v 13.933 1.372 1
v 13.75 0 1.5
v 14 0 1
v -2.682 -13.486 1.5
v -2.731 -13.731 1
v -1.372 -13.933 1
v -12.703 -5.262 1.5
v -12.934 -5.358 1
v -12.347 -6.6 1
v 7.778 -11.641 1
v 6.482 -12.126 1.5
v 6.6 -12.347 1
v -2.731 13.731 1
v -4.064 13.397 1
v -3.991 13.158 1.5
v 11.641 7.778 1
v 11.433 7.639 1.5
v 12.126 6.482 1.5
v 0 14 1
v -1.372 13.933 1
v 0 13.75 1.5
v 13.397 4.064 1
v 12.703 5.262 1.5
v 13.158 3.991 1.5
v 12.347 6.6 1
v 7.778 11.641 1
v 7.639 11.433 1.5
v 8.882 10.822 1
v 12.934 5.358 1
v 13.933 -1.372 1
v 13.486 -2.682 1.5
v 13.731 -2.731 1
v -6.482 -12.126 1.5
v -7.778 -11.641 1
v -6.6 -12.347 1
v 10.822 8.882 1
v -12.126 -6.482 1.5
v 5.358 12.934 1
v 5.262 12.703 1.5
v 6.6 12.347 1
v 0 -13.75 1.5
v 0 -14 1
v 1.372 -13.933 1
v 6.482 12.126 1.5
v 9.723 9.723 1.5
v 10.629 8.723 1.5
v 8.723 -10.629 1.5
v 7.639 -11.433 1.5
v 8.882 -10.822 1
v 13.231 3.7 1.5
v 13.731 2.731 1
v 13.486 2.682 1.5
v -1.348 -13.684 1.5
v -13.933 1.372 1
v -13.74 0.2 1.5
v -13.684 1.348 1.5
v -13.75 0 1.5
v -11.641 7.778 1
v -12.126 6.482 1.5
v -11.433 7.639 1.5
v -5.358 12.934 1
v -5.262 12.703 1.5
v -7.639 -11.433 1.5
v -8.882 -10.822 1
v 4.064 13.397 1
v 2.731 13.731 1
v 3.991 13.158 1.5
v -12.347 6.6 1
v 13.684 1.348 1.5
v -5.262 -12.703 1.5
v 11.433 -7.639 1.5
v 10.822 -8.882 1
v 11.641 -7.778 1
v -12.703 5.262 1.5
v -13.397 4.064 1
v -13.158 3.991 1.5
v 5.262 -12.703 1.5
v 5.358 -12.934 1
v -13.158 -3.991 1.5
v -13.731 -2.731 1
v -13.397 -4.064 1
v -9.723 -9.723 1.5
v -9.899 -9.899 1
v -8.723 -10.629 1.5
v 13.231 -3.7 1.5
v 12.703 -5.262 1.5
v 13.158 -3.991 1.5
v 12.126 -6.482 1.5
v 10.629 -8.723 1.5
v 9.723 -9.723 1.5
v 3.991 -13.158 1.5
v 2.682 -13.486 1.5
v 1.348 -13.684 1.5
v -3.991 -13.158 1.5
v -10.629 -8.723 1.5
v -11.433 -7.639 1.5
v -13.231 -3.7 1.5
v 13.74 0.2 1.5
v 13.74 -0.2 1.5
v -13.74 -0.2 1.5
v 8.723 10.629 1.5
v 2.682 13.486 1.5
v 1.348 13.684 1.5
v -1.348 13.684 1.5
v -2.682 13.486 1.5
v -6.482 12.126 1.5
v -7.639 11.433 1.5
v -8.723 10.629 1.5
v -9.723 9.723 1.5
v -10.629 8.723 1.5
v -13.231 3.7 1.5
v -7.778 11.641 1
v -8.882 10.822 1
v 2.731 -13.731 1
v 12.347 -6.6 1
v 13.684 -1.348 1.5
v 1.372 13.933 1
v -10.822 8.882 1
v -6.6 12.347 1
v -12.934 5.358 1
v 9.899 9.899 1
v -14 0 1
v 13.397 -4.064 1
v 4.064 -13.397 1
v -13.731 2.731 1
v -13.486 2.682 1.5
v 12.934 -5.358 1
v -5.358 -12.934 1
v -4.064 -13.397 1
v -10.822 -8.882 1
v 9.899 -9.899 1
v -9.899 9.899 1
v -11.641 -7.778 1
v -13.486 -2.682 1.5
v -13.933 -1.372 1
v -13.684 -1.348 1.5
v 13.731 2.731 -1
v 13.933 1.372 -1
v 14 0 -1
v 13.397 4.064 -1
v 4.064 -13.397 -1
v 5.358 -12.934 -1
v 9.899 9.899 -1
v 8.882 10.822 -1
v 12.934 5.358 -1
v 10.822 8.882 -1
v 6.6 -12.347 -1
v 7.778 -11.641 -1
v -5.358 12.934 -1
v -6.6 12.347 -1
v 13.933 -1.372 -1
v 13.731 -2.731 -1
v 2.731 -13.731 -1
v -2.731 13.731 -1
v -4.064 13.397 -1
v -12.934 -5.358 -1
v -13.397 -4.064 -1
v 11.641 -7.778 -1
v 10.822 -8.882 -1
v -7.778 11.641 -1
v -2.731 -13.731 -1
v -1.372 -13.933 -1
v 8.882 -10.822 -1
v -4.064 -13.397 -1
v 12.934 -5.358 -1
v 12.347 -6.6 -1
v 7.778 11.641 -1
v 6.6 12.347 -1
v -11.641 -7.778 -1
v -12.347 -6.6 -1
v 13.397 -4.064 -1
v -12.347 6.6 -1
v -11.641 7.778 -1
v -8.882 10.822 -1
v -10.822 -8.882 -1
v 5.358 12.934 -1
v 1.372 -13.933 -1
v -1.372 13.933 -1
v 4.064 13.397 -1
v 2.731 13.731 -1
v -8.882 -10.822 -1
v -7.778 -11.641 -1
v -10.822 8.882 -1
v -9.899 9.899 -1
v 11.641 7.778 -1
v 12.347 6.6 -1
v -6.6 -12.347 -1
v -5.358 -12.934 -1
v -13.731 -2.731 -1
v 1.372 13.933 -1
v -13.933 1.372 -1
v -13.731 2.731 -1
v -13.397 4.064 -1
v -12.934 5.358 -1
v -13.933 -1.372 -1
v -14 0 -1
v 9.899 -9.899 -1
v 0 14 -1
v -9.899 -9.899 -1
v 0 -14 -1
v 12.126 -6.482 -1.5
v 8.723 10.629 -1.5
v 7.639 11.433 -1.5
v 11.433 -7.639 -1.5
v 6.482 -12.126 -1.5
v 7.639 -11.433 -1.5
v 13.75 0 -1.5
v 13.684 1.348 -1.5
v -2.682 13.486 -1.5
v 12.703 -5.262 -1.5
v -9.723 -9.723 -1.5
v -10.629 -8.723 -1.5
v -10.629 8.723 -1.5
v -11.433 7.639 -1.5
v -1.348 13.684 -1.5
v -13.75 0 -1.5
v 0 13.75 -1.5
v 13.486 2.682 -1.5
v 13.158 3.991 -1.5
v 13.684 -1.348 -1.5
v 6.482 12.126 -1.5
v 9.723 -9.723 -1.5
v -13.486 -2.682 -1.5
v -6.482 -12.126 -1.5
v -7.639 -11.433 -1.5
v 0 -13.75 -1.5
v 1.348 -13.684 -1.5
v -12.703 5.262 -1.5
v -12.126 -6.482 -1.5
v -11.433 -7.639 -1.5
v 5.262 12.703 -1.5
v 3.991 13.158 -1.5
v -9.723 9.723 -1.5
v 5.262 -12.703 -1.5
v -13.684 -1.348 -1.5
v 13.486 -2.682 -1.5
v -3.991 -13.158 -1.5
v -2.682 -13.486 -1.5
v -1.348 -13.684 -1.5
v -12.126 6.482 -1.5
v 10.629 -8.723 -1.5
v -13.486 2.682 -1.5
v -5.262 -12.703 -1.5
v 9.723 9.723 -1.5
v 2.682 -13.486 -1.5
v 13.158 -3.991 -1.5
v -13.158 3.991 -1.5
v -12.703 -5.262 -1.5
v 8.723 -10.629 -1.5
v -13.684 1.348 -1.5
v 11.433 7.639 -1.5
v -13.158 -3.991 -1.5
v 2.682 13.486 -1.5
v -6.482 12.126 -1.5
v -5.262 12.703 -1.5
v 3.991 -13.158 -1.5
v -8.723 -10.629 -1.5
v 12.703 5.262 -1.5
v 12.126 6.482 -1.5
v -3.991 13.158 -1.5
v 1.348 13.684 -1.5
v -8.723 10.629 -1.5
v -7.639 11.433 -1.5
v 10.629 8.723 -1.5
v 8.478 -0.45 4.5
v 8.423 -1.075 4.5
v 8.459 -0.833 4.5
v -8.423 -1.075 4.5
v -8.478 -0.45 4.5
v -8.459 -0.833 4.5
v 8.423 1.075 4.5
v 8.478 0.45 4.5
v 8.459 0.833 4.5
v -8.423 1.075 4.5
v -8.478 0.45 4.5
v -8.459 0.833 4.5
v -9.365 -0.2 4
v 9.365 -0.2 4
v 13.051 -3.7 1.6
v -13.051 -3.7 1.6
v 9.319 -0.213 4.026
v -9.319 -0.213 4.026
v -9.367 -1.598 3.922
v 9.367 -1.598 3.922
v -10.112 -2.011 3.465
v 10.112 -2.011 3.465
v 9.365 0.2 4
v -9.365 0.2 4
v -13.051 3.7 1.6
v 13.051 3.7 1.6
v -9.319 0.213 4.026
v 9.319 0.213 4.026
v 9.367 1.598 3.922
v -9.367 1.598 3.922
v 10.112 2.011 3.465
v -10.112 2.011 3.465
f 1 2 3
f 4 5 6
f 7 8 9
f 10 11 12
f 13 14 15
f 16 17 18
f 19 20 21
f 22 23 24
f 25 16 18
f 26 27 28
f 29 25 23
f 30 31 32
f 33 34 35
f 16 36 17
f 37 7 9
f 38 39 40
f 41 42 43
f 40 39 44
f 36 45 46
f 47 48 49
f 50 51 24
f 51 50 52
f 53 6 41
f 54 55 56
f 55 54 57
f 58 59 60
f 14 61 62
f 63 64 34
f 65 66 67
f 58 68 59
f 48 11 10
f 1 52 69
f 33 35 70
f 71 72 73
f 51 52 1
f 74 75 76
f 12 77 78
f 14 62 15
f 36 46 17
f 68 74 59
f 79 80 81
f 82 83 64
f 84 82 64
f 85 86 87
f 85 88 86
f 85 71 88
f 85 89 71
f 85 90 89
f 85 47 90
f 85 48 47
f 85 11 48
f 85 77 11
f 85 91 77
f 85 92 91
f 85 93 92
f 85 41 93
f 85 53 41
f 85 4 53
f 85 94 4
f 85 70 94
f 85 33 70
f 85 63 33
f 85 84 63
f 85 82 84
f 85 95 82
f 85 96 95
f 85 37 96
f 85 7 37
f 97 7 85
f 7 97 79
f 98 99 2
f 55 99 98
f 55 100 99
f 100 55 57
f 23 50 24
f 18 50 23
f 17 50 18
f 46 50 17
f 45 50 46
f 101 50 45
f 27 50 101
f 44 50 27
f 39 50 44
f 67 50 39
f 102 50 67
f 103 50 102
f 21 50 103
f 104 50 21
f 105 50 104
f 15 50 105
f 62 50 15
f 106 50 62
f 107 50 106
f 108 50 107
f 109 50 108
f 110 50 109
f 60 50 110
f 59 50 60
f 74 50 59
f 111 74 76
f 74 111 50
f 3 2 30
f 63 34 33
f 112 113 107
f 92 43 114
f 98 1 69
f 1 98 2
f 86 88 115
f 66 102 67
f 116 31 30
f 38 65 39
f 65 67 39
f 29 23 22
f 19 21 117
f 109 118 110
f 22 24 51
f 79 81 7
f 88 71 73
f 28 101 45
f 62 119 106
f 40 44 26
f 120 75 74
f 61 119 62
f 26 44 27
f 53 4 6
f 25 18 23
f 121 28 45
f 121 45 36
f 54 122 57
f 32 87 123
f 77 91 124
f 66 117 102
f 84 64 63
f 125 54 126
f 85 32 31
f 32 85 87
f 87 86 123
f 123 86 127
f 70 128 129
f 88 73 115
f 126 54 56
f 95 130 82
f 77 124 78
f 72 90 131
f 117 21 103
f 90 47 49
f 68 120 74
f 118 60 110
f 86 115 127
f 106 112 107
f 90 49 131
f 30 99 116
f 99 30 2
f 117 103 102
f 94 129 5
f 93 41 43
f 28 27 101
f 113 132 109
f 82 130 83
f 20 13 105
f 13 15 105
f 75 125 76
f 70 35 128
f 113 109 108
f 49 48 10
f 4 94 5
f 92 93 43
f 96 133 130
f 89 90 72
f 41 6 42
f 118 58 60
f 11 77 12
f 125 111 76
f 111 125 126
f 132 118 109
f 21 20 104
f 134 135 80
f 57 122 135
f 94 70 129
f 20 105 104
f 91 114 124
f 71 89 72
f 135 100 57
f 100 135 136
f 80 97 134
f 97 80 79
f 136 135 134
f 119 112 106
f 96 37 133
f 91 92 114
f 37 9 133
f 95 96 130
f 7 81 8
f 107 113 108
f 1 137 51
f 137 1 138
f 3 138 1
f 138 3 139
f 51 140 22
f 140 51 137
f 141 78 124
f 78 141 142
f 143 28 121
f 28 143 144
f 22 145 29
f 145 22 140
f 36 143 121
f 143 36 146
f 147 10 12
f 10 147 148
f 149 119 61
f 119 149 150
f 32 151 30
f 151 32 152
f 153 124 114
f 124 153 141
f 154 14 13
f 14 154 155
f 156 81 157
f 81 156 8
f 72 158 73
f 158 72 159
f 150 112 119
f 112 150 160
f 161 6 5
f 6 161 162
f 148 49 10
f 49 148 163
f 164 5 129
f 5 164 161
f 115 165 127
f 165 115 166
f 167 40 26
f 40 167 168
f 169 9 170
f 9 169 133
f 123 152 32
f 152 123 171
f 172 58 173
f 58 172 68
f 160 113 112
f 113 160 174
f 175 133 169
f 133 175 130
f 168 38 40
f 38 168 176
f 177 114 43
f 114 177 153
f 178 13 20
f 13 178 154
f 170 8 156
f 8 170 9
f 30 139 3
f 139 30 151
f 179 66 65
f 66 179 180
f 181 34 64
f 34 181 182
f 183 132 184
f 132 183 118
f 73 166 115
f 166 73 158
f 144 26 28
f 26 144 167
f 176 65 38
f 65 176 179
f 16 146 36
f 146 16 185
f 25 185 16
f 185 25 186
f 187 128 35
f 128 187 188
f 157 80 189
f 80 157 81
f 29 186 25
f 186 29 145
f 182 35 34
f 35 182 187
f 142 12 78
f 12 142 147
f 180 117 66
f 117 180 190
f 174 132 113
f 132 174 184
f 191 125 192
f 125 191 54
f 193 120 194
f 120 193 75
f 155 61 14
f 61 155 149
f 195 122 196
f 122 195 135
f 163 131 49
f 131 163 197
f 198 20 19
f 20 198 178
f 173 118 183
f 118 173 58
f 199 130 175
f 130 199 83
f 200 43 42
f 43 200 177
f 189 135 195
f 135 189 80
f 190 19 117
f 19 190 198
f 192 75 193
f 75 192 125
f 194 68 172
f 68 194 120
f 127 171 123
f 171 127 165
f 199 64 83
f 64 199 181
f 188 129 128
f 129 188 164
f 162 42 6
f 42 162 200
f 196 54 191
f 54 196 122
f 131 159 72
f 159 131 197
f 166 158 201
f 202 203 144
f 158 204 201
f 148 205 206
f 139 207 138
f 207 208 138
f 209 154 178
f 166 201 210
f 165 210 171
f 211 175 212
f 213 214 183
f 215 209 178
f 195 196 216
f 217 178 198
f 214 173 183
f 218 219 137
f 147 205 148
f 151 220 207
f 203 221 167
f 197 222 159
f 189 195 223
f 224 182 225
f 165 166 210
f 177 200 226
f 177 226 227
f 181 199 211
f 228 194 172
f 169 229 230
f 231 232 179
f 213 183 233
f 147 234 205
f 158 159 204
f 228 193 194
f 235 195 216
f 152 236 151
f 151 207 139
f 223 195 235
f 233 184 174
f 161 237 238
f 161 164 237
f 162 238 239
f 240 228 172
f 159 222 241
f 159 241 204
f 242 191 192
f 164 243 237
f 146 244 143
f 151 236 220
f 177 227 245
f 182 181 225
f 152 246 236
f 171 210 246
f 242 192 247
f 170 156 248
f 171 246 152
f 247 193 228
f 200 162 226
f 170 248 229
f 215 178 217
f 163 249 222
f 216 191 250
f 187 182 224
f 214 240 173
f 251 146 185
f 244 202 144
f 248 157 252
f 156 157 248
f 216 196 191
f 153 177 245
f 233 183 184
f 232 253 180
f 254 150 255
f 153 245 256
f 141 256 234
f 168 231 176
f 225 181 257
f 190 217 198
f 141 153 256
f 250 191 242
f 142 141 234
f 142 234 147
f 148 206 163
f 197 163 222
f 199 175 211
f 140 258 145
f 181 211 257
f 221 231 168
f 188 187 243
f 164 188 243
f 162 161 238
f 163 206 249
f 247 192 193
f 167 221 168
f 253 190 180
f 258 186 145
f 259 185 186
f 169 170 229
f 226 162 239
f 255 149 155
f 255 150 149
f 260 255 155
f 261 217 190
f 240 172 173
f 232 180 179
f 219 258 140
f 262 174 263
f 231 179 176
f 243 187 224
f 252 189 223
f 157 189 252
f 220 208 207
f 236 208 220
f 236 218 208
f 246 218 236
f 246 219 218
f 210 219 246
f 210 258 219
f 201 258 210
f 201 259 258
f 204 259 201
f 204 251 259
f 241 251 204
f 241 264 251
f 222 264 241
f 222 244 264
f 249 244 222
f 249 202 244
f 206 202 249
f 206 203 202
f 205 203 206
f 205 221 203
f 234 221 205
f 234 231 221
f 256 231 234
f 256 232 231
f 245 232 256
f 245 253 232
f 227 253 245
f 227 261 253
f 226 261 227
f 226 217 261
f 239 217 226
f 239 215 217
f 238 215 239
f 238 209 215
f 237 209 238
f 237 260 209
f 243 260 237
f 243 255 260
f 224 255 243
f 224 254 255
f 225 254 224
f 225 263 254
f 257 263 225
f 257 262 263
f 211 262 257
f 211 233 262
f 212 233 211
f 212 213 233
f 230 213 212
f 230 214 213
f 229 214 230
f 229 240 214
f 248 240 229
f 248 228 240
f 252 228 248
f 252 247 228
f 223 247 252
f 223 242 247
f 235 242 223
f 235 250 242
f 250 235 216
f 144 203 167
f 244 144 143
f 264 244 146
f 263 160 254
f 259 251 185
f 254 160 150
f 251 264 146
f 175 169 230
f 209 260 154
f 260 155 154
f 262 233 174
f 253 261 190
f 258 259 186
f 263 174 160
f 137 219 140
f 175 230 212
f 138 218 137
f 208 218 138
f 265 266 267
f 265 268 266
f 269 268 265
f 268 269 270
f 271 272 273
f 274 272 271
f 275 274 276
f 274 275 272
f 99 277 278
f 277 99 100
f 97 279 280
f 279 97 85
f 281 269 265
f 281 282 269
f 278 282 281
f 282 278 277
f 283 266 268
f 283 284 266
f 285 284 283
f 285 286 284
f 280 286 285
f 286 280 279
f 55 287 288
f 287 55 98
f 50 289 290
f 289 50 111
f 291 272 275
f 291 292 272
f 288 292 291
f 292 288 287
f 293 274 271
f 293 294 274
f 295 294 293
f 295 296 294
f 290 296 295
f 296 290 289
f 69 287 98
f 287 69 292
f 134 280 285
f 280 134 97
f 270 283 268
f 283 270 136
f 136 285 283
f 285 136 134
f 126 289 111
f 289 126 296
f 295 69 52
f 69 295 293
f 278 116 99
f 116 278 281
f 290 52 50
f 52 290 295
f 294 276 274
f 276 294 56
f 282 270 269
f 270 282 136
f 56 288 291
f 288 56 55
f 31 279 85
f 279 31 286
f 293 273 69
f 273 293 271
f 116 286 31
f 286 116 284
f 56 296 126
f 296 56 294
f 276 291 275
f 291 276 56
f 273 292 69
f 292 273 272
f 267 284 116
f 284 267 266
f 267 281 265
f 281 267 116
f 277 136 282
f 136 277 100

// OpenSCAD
$fn=64;

//TODO
// - decal / number for token
// - clean up module parameters for consistency

// Token base
base_diameter = 28; // This should match the grid size (mm) of the map you use
base_height = 3;
base_chamfer = 0.5;

// Stand - this holds the mini
stand_height = 3;
stand_side_thickness = 3.5;
stand_chamfer = 0.5;
slot_space = 0.4; // This should match the thickness of the material you plan on putting in the slot


// calculated values
stand_width = base_diameter - base_chamfer;
stand_slope = stand_side_thickness*1.5;


module chamfered_cylinder(diameter, height, chamfer) {    
    middle_height = height - chamfer*2;
    end_diameter = diameter-chamfer;
    
    //top
    translate([0,0,+middle_height/2+chamfer/2]) 
        cylinder(h = chamfer,d1=diameter, d2=end_diameter,center=true);
    
    //middle
    cylinder(h = middle_height,d=diameter,center=true);
    
    //bottom
    translate([0,0,-middle_height/2-chamfer/2]) 
        cylinder(h = chamfer,d1=end_diameter, d2=diameter,center=true);    
}


module stand_side (width, thickness, height, slope, chamfer) {    
    ll = [-width/2,-thickness/2]; // LL
    lr = [width/2,-thickness/2]; // LR
    tl = [-width/2,thickness/2]; // TL
    tr = [width/2,thickness/2]; // TR
    
    hull()
    {
        // bottom
        linear_extrude(0.1) 
        polygon([
            ll,
            tl,
            tr,
            lr
        ]);
        
        // middle
        translate([0,0,height-chamfer*2]) 
        linear_extrude(chamfer) 
        polygon([    
            ll + [0,slope/2],
            tl,
            tr,
            lr + [0,slope/2]   
        ]);
        
        // top
        translate([0,0,height-chamfer]) 
        linear_extrude(chamfer) 
        polygon([    
            ll + [0,slope/2] ,
            tl - [0,chamfer/2],
            tr - [0,chamfer/2],
            lr + [0,slope/2]     
        ]);
    };
    
}

module stand_combined(){
        translate([0,-(stand_side_thickness+slot_space)/2,0])
        stand_side(stand_width, stand_side_thickness, stand_height, stand_slope, stand_chamfer);

        translate([0,(stand_side_thickness+slot_space)/2,0])
        rotate(180)
        stand_side(stand_width, stand_side_thickness, stand_height, stand_slope, stand_chamfer);
}


module stand(){
    // Round the stand base so it doesn't overhang the edge of the token
    intersection(){
        stand_combined();
        cylinder(d1=base_diameter-base_chamfer, d2=base_diameter-base_chamfer-stand_slope*2, h=stand_height);
    }
        
}

chamfered_cylinder(base_diameter, base_height, base_chamfer);
translate([0,0,base_height/2]) 
stand();
